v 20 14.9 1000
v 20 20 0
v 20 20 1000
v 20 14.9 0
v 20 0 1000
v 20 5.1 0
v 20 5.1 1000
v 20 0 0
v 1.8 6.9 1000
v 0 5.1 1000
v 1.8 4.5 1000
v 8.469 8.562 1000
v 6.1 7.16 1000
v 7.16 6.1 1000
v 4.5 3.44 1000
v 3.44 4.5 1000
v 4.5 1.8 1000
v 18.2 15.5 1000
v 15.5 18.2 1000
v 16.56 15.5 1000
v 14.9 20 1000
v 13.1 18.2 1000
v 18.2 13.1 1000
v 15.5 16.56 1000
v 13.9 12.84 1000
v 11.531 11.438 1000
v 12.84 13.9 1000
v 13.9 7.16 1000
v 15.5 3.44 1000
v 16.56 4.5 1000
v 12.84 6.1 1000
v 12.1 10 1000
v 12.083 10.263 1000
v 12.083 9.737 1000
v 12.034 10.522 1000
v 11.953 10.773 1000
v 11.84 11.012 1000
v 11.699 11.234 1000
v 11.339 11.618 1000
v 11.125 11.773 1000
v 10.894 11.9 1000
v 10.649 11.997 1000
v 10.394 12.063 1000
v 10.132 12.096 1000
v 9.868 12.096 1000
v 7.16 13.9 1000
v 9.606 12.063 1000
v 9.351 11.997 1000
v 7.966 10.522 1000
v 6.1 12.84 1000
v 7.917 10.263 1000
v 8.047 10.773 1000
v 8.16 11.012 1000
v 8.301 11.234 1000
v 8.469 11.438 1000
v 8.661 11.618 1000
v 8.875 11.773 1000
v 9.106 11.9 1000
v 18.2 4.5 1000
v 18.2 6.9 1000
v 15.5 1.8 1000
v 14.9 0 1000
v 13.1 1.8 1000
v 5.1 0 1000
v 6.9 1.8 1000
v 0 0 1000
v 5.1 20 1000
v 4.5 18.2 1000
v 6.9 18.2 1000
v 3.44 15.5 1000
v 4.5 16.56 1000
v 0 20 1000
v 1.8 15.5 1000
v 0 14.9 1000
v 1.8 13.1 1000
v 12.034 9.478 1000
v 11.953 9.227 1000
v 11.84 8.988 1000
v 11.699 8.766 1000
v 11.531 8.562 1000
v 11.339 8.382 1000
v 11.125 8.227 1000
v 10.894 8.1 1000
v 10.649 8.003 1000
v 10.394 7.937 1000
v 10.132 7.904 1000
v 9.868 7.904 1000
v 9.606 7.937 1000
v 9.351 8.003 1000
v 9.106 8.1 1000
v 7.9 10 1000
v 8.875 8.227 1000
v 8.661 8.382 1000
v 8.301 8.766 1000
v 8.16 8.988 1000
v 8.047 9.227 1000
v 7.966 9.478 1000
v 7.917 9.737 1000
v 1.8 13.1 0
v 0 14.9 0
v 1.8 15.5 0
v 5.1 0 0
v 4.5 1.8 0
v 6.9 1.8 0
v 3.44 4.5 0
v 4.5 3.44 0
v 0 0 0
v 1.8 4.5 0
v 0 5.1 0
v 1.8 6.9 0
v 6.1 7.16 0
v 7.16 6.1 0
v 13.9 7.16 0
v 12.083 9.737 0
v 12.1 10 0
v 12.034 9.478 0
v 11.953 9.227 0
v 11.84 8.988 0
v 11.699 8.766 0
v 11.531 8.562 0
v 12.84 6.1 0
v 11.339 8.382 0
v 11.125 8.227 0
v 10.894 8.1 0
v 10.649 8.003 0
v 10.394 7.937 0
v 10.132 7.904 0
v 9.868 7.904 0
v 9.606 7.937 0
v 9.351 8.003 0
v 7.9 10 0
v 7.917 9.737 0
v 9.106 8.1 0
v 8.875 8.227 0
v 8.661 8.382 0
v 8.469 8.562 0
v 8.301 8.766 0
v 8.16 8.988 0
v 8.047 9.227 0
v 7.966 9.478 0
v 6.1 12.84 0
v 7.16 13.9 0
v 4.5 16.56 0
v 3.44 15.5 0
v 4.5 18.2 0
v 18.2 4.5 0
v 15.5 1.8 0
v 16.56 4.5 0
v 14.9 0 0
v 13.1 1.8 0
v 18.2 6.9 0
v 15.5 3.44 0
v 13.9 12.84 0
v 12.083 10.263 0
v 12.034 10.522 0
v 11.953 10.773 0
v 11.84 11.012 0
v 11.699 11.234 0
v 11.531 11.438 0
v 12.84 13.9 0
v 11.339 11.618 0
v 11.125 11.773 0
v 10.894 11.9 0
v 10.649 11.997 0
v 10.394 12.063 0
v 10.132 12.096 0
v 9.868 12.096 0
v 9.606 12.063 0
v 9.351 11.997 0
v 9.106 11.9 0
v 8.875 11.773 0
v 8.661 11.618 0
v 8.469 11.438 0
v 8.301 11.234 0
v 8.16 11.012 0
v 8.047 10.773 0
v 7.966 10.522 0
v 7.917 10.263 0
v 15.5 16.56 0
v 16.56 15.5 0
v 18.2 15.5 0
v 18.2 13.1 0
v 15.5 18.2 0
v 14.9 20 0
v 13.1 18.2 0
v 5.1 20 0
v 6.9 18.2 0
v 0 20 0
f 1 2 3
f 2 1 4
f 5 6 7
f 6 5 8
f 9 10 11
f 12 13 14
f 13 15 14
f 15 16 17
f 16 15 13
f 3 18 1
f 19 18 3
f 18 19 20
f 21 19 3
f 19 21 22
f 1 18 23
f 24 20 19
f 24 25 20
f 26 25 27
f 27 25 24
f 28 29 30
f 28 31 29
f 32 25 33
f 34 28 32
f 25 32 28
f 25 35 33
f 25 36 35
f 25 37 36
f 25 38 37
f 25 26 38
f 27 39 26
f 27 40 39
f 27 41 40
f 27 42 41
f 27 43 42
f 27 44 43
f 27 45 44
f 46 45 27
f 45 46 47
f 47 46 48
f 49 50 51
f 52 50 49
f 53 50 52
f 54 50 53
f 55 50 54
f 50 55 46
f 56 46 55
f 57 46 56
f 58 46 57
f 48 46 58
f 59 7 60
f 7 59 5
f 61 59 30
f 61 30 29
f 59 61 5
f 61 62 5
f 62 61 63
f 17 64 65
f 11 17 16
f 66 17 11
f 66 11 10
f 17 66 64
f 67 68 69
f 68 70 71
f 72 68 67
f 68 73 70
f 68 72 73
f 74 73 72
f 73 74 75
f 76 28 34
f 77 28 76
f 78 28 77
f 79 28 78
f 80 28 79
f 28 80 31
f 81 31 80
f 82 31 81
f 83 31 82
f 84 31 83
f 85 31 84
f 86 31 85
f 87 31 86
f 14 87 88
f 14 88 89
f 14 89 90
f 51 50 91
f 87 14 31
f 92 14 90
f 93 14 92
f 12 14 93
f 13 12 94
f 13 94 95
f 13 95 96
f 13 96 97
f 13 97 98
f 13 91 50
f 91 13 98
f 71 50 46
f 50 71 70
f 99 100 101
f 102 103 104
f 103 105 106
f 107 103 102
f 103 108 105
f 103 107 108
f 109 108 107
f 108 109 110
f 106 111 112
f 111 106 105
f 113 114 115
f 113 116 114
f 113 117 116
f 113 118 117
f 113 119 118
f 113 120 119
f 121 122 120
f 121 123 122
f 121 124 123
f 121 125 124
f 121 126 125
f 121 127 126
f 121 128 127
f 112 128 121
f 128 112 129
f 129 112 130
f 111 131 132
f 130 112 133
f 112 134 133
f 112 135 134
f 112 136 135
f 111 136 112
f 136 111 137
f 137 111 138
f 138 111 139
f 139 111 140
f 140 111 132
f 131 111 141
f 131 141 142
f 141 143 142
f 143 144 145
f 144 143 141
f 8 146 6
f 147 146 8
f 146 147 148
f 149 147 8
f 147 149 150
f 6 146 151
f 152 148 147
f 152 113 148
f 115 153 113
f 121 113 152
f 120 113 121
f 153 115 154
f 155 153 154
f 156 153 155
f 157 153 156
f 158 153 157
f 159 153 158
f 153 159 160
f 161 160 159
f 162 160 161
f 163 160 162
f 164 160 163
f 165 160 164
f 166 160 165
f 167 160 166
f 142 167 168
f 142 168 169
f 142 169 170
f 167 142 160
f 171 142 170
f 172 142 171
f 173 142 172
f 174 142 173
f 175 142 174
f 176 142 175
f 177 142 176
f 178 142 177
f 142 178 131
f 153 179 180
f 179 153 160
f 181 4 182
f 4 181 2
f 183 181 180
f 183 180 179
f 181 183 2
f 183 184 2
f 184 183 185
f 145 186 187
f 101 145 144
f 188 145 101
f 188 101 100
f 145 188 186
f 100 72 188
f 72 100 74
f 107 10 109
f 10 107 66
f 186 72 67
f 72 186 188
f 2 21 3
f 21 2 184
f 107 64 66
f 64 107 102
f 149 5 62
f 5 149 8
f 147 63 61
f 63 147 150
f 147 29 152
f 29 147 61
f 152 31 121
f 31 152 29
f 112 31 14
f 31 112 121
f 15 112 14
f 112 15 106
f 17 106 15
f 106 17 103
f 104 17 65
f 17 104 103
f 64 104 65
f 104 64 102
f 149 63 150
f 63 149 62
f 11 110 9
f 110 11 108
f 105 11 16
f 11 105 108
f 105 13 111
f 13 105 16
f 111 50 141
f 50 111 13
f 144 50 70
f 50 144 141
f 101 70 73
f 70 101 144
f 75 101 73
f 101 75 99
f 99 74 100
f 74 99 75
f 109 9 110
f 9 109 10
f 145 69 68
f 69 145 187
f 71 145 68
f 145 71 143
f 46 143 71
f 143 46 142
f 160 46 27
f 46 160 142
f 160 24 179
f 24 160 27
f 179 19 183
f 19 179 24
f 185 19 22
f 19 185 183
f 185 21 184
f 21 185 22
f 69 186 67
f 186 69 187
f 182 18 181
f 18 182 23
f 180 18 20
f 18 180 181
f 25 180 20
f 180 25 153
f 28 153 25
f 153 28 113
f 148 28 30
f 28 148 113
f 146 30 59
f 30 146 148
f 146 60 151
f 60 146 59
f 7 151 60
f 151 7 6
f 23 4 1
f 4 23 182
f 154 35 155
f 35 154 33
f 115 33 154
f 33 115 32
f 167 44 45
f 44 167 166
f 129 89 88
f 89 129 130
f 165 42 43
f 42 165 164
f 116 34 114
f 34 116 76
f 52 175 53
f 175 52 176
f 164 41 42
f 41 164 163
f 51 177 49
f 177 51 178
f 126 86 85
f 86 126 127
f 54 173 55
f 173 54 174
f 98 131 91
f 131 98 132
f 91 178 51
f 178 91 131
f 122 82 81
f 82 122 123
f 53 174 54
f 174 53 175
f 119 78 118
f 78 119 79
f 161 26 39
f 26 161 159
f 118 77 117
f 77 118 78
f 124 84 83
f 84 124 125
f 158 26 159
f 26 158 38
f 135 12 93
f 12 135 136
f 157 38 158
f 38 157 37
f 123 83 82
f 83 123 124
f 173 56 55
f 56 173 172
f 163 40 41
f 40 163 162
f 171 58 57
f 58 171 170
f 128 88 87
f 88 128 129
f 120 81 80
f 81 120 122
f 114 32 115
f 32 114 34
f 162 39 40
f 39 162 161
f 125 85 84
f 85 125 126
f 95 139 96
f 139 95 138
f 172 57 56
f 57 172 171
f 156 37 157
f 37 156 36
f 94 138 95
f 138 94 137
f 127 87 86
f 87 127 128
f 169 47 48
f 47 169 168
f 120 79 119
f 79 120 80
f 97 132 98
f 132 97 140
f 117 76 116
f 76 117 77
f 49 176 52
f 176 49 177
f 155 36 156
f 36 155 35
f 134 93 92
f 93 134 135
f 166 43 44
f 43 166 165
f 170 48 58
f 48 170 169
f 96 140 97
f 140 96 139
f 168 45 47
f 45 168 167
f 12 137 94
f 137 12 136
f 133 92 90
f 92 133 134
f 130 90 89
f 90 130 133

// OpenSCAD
// Generated by SolidPython 1.1.3 on 2022-04-28 23:56:22


difference() {
	cube(size = [20.0000000000, 20.0000000000, 1000]);
	translate(v = [5.1000000000, 0, 0]) {
		linear_extrude(center = false, convexity = 10, height = 1000, twist = 0) {
			polygon(points = [[0.0000000000, 0.0000000000], [1.8000000000, 1.8000000000], [-0.6000000000, 1.8000000000], [-0.6000000000, 3.4400000000], [2.0600000000, 6.1000000000], [7.7400000000, 6.1000000000], [10.4000000000, 3.4400000000], [10.4000000000, 1.8000000000], [8, 1.8000000000], [9.8000000000, 0.0000000000], [0.0000000000, 0.0000000000]]);
		}
	}
	translate(v = [0, 14.9000000000, 0]) {
		rotate(a = [0, 0, 270]) {
			linear_extrude(center = false, convexity = 10, height = 1000, twist = 0) {
				polygon(points = [[0.0000000000, 0.0000000000], [1.8000000000, 1.8000000000], [-0.6000000000, 1.8000000000], [-0.6000000000, 3.4400000000], [2.0600000000, 6.1000000000], [7.7400000000, 6.1000000000], [10.4000000000, 3.4400000000], [10.4000000000, 1.8000000000], [8, 1.8000000000], [9.8000000000, 0.0000000000], [0.0000000000, 0.0000000000]]);
			}
		}
	}
	translate(v = [14.9000000000, 0, 0]) {
		translate(v = [0, 20.0000000000, 0]) {
			rotate(a = [0, 0, 180]) {
				linear_extrude(center = false, convexity = 10, height = 1000, twist = 0) {
					polygon(points = [[0.0000000000, 0.0000000000], [1.8000000000, 1.8000000000], [-0.6000000000, 1.8000000000], [-0.6000000000, 3.4400000000], [2.0600000000, 6.1000000000], [7.7400000000, 6.1000000000], [10.4000000000, 3.4400000000], [10.4000000000, 1.8000000000], [8, 1.8000000000], [9.8000000000, 0.0000000000], [0.0000000000, 0.0000000000]]);
				}
			}
		}
	}
	translate(v = [20.0000000000, 0, 0]) {
		translate(v = [0, 5.1000000000, 0]) {
			rotate(a = [0, 0, 90]) {
				linear_extrude(center = false, convexity = 10, height = 1000, twist = 0) {
					polygon(points = [[0.0000000000, 0.0000000000], [1.8000000000, 1.8000000000], [-0.6000000000, 1.8000000000], [-0.6000000000, 3.4400000000], [2.0600000000, 6.1000000000], [7.7400000000, 6.1000000000], [10.4000000000, 3.4400000000], [10.4000000000, 1.8000000000], [8, 1.8000000000], [9.8000000000, 0.0000000000], [0.0000000000, 0.0000000000]]);
				}
			}
		}
	}
	translate(v = [0, 10.0000000000, 0]) {
		translate(v = [10.0000000000, 0, 0]) {
			cylinder($fn = 50, h = 1000, r = 2.1000000000);
		}
	}
}
/***********************************************
*********      SolidPython code:      **********
************************************************
 
from solid import *
from solid.utils import *  # Not required, but the utils module is useful

GROOVE_WIDTH = 9.8

def make_groove(height):
    # Define the shape of the vslot grooves as a polygon.
    groove_points = [
        [0.0, 0.0, 0.0],
        [1.8, 1.8, 0.0],
        [-0.6, 1.8, 0.0],
        [-0.6, 3.44, 0.0],
        [2.06, 6.1, 0.0],
        [7.74, 6.1, 0.0],
        [10.4, 3.44, 0.0],
        [10.4, 1.8, 0.0],
        [8, 1.8, 0.0],
        [9.8, 0.0, 0.0],
        [0.0, 0.0, 0.0],
    ];

    # Extrude the groove polygon into a 3d object.
    return linear_extrude(height = height, center = False, convexity = 10, twist = 0)(
        polygon(groove_points)
    );

def make_2020(height):
    # Overall dimensions
    side = 20.0;

    translate_dist = (side/2) - (GROOVE_WIDTH/2);

    bottom_groove = right(translate_dist)(
        make_groove(height)
    );

    left_groove = forward(translate_dist + GROOVE_WIDTH)(
        rotate([0, 0, 270])(
            make_groove(height)
        )
    );

    top_groove = right(translate_dist + GROOVE_WIDTH)(
        forward(side)(
            rotate([0, 0, 180])(
                make_groove(height)
            )
        )
    );
    
    right_groove = right(side)(
        forward(translate_dist)(
            rotate([0, 0, 90])(
                make_groove(height)
            )
        )
    );

    center_hole = forward(side/2)(
        right(side/2)(
            cylinder(h=height, r=2.1, segments=50)
        )
    );

    return cube([side, side, height]) - bottom_groove - left_groove - top_groove - right_groove - center_hole;

# Test renders
scad_render_to_file(make_2020(250), '../../scad/vslot2020_250mm.scad');
scad_render_to_file(make_2020(500), '../../scad/vslot2020_500mm.scad');
scad_render_to_file(make_2020(1000), '../../scad/vslot2020_1000mm.scad');
scad_render_to_file(make_2020(1500), '../../scad/vslot2020_1500mm.scad');
scad_render_to_file(make_2020(2000), '../../scad/vslot2020_2000mm.scad');
scad_render_to_file(make_groove(250), '../../scad/vslotgroove.scad'); 
 
************************************************/
